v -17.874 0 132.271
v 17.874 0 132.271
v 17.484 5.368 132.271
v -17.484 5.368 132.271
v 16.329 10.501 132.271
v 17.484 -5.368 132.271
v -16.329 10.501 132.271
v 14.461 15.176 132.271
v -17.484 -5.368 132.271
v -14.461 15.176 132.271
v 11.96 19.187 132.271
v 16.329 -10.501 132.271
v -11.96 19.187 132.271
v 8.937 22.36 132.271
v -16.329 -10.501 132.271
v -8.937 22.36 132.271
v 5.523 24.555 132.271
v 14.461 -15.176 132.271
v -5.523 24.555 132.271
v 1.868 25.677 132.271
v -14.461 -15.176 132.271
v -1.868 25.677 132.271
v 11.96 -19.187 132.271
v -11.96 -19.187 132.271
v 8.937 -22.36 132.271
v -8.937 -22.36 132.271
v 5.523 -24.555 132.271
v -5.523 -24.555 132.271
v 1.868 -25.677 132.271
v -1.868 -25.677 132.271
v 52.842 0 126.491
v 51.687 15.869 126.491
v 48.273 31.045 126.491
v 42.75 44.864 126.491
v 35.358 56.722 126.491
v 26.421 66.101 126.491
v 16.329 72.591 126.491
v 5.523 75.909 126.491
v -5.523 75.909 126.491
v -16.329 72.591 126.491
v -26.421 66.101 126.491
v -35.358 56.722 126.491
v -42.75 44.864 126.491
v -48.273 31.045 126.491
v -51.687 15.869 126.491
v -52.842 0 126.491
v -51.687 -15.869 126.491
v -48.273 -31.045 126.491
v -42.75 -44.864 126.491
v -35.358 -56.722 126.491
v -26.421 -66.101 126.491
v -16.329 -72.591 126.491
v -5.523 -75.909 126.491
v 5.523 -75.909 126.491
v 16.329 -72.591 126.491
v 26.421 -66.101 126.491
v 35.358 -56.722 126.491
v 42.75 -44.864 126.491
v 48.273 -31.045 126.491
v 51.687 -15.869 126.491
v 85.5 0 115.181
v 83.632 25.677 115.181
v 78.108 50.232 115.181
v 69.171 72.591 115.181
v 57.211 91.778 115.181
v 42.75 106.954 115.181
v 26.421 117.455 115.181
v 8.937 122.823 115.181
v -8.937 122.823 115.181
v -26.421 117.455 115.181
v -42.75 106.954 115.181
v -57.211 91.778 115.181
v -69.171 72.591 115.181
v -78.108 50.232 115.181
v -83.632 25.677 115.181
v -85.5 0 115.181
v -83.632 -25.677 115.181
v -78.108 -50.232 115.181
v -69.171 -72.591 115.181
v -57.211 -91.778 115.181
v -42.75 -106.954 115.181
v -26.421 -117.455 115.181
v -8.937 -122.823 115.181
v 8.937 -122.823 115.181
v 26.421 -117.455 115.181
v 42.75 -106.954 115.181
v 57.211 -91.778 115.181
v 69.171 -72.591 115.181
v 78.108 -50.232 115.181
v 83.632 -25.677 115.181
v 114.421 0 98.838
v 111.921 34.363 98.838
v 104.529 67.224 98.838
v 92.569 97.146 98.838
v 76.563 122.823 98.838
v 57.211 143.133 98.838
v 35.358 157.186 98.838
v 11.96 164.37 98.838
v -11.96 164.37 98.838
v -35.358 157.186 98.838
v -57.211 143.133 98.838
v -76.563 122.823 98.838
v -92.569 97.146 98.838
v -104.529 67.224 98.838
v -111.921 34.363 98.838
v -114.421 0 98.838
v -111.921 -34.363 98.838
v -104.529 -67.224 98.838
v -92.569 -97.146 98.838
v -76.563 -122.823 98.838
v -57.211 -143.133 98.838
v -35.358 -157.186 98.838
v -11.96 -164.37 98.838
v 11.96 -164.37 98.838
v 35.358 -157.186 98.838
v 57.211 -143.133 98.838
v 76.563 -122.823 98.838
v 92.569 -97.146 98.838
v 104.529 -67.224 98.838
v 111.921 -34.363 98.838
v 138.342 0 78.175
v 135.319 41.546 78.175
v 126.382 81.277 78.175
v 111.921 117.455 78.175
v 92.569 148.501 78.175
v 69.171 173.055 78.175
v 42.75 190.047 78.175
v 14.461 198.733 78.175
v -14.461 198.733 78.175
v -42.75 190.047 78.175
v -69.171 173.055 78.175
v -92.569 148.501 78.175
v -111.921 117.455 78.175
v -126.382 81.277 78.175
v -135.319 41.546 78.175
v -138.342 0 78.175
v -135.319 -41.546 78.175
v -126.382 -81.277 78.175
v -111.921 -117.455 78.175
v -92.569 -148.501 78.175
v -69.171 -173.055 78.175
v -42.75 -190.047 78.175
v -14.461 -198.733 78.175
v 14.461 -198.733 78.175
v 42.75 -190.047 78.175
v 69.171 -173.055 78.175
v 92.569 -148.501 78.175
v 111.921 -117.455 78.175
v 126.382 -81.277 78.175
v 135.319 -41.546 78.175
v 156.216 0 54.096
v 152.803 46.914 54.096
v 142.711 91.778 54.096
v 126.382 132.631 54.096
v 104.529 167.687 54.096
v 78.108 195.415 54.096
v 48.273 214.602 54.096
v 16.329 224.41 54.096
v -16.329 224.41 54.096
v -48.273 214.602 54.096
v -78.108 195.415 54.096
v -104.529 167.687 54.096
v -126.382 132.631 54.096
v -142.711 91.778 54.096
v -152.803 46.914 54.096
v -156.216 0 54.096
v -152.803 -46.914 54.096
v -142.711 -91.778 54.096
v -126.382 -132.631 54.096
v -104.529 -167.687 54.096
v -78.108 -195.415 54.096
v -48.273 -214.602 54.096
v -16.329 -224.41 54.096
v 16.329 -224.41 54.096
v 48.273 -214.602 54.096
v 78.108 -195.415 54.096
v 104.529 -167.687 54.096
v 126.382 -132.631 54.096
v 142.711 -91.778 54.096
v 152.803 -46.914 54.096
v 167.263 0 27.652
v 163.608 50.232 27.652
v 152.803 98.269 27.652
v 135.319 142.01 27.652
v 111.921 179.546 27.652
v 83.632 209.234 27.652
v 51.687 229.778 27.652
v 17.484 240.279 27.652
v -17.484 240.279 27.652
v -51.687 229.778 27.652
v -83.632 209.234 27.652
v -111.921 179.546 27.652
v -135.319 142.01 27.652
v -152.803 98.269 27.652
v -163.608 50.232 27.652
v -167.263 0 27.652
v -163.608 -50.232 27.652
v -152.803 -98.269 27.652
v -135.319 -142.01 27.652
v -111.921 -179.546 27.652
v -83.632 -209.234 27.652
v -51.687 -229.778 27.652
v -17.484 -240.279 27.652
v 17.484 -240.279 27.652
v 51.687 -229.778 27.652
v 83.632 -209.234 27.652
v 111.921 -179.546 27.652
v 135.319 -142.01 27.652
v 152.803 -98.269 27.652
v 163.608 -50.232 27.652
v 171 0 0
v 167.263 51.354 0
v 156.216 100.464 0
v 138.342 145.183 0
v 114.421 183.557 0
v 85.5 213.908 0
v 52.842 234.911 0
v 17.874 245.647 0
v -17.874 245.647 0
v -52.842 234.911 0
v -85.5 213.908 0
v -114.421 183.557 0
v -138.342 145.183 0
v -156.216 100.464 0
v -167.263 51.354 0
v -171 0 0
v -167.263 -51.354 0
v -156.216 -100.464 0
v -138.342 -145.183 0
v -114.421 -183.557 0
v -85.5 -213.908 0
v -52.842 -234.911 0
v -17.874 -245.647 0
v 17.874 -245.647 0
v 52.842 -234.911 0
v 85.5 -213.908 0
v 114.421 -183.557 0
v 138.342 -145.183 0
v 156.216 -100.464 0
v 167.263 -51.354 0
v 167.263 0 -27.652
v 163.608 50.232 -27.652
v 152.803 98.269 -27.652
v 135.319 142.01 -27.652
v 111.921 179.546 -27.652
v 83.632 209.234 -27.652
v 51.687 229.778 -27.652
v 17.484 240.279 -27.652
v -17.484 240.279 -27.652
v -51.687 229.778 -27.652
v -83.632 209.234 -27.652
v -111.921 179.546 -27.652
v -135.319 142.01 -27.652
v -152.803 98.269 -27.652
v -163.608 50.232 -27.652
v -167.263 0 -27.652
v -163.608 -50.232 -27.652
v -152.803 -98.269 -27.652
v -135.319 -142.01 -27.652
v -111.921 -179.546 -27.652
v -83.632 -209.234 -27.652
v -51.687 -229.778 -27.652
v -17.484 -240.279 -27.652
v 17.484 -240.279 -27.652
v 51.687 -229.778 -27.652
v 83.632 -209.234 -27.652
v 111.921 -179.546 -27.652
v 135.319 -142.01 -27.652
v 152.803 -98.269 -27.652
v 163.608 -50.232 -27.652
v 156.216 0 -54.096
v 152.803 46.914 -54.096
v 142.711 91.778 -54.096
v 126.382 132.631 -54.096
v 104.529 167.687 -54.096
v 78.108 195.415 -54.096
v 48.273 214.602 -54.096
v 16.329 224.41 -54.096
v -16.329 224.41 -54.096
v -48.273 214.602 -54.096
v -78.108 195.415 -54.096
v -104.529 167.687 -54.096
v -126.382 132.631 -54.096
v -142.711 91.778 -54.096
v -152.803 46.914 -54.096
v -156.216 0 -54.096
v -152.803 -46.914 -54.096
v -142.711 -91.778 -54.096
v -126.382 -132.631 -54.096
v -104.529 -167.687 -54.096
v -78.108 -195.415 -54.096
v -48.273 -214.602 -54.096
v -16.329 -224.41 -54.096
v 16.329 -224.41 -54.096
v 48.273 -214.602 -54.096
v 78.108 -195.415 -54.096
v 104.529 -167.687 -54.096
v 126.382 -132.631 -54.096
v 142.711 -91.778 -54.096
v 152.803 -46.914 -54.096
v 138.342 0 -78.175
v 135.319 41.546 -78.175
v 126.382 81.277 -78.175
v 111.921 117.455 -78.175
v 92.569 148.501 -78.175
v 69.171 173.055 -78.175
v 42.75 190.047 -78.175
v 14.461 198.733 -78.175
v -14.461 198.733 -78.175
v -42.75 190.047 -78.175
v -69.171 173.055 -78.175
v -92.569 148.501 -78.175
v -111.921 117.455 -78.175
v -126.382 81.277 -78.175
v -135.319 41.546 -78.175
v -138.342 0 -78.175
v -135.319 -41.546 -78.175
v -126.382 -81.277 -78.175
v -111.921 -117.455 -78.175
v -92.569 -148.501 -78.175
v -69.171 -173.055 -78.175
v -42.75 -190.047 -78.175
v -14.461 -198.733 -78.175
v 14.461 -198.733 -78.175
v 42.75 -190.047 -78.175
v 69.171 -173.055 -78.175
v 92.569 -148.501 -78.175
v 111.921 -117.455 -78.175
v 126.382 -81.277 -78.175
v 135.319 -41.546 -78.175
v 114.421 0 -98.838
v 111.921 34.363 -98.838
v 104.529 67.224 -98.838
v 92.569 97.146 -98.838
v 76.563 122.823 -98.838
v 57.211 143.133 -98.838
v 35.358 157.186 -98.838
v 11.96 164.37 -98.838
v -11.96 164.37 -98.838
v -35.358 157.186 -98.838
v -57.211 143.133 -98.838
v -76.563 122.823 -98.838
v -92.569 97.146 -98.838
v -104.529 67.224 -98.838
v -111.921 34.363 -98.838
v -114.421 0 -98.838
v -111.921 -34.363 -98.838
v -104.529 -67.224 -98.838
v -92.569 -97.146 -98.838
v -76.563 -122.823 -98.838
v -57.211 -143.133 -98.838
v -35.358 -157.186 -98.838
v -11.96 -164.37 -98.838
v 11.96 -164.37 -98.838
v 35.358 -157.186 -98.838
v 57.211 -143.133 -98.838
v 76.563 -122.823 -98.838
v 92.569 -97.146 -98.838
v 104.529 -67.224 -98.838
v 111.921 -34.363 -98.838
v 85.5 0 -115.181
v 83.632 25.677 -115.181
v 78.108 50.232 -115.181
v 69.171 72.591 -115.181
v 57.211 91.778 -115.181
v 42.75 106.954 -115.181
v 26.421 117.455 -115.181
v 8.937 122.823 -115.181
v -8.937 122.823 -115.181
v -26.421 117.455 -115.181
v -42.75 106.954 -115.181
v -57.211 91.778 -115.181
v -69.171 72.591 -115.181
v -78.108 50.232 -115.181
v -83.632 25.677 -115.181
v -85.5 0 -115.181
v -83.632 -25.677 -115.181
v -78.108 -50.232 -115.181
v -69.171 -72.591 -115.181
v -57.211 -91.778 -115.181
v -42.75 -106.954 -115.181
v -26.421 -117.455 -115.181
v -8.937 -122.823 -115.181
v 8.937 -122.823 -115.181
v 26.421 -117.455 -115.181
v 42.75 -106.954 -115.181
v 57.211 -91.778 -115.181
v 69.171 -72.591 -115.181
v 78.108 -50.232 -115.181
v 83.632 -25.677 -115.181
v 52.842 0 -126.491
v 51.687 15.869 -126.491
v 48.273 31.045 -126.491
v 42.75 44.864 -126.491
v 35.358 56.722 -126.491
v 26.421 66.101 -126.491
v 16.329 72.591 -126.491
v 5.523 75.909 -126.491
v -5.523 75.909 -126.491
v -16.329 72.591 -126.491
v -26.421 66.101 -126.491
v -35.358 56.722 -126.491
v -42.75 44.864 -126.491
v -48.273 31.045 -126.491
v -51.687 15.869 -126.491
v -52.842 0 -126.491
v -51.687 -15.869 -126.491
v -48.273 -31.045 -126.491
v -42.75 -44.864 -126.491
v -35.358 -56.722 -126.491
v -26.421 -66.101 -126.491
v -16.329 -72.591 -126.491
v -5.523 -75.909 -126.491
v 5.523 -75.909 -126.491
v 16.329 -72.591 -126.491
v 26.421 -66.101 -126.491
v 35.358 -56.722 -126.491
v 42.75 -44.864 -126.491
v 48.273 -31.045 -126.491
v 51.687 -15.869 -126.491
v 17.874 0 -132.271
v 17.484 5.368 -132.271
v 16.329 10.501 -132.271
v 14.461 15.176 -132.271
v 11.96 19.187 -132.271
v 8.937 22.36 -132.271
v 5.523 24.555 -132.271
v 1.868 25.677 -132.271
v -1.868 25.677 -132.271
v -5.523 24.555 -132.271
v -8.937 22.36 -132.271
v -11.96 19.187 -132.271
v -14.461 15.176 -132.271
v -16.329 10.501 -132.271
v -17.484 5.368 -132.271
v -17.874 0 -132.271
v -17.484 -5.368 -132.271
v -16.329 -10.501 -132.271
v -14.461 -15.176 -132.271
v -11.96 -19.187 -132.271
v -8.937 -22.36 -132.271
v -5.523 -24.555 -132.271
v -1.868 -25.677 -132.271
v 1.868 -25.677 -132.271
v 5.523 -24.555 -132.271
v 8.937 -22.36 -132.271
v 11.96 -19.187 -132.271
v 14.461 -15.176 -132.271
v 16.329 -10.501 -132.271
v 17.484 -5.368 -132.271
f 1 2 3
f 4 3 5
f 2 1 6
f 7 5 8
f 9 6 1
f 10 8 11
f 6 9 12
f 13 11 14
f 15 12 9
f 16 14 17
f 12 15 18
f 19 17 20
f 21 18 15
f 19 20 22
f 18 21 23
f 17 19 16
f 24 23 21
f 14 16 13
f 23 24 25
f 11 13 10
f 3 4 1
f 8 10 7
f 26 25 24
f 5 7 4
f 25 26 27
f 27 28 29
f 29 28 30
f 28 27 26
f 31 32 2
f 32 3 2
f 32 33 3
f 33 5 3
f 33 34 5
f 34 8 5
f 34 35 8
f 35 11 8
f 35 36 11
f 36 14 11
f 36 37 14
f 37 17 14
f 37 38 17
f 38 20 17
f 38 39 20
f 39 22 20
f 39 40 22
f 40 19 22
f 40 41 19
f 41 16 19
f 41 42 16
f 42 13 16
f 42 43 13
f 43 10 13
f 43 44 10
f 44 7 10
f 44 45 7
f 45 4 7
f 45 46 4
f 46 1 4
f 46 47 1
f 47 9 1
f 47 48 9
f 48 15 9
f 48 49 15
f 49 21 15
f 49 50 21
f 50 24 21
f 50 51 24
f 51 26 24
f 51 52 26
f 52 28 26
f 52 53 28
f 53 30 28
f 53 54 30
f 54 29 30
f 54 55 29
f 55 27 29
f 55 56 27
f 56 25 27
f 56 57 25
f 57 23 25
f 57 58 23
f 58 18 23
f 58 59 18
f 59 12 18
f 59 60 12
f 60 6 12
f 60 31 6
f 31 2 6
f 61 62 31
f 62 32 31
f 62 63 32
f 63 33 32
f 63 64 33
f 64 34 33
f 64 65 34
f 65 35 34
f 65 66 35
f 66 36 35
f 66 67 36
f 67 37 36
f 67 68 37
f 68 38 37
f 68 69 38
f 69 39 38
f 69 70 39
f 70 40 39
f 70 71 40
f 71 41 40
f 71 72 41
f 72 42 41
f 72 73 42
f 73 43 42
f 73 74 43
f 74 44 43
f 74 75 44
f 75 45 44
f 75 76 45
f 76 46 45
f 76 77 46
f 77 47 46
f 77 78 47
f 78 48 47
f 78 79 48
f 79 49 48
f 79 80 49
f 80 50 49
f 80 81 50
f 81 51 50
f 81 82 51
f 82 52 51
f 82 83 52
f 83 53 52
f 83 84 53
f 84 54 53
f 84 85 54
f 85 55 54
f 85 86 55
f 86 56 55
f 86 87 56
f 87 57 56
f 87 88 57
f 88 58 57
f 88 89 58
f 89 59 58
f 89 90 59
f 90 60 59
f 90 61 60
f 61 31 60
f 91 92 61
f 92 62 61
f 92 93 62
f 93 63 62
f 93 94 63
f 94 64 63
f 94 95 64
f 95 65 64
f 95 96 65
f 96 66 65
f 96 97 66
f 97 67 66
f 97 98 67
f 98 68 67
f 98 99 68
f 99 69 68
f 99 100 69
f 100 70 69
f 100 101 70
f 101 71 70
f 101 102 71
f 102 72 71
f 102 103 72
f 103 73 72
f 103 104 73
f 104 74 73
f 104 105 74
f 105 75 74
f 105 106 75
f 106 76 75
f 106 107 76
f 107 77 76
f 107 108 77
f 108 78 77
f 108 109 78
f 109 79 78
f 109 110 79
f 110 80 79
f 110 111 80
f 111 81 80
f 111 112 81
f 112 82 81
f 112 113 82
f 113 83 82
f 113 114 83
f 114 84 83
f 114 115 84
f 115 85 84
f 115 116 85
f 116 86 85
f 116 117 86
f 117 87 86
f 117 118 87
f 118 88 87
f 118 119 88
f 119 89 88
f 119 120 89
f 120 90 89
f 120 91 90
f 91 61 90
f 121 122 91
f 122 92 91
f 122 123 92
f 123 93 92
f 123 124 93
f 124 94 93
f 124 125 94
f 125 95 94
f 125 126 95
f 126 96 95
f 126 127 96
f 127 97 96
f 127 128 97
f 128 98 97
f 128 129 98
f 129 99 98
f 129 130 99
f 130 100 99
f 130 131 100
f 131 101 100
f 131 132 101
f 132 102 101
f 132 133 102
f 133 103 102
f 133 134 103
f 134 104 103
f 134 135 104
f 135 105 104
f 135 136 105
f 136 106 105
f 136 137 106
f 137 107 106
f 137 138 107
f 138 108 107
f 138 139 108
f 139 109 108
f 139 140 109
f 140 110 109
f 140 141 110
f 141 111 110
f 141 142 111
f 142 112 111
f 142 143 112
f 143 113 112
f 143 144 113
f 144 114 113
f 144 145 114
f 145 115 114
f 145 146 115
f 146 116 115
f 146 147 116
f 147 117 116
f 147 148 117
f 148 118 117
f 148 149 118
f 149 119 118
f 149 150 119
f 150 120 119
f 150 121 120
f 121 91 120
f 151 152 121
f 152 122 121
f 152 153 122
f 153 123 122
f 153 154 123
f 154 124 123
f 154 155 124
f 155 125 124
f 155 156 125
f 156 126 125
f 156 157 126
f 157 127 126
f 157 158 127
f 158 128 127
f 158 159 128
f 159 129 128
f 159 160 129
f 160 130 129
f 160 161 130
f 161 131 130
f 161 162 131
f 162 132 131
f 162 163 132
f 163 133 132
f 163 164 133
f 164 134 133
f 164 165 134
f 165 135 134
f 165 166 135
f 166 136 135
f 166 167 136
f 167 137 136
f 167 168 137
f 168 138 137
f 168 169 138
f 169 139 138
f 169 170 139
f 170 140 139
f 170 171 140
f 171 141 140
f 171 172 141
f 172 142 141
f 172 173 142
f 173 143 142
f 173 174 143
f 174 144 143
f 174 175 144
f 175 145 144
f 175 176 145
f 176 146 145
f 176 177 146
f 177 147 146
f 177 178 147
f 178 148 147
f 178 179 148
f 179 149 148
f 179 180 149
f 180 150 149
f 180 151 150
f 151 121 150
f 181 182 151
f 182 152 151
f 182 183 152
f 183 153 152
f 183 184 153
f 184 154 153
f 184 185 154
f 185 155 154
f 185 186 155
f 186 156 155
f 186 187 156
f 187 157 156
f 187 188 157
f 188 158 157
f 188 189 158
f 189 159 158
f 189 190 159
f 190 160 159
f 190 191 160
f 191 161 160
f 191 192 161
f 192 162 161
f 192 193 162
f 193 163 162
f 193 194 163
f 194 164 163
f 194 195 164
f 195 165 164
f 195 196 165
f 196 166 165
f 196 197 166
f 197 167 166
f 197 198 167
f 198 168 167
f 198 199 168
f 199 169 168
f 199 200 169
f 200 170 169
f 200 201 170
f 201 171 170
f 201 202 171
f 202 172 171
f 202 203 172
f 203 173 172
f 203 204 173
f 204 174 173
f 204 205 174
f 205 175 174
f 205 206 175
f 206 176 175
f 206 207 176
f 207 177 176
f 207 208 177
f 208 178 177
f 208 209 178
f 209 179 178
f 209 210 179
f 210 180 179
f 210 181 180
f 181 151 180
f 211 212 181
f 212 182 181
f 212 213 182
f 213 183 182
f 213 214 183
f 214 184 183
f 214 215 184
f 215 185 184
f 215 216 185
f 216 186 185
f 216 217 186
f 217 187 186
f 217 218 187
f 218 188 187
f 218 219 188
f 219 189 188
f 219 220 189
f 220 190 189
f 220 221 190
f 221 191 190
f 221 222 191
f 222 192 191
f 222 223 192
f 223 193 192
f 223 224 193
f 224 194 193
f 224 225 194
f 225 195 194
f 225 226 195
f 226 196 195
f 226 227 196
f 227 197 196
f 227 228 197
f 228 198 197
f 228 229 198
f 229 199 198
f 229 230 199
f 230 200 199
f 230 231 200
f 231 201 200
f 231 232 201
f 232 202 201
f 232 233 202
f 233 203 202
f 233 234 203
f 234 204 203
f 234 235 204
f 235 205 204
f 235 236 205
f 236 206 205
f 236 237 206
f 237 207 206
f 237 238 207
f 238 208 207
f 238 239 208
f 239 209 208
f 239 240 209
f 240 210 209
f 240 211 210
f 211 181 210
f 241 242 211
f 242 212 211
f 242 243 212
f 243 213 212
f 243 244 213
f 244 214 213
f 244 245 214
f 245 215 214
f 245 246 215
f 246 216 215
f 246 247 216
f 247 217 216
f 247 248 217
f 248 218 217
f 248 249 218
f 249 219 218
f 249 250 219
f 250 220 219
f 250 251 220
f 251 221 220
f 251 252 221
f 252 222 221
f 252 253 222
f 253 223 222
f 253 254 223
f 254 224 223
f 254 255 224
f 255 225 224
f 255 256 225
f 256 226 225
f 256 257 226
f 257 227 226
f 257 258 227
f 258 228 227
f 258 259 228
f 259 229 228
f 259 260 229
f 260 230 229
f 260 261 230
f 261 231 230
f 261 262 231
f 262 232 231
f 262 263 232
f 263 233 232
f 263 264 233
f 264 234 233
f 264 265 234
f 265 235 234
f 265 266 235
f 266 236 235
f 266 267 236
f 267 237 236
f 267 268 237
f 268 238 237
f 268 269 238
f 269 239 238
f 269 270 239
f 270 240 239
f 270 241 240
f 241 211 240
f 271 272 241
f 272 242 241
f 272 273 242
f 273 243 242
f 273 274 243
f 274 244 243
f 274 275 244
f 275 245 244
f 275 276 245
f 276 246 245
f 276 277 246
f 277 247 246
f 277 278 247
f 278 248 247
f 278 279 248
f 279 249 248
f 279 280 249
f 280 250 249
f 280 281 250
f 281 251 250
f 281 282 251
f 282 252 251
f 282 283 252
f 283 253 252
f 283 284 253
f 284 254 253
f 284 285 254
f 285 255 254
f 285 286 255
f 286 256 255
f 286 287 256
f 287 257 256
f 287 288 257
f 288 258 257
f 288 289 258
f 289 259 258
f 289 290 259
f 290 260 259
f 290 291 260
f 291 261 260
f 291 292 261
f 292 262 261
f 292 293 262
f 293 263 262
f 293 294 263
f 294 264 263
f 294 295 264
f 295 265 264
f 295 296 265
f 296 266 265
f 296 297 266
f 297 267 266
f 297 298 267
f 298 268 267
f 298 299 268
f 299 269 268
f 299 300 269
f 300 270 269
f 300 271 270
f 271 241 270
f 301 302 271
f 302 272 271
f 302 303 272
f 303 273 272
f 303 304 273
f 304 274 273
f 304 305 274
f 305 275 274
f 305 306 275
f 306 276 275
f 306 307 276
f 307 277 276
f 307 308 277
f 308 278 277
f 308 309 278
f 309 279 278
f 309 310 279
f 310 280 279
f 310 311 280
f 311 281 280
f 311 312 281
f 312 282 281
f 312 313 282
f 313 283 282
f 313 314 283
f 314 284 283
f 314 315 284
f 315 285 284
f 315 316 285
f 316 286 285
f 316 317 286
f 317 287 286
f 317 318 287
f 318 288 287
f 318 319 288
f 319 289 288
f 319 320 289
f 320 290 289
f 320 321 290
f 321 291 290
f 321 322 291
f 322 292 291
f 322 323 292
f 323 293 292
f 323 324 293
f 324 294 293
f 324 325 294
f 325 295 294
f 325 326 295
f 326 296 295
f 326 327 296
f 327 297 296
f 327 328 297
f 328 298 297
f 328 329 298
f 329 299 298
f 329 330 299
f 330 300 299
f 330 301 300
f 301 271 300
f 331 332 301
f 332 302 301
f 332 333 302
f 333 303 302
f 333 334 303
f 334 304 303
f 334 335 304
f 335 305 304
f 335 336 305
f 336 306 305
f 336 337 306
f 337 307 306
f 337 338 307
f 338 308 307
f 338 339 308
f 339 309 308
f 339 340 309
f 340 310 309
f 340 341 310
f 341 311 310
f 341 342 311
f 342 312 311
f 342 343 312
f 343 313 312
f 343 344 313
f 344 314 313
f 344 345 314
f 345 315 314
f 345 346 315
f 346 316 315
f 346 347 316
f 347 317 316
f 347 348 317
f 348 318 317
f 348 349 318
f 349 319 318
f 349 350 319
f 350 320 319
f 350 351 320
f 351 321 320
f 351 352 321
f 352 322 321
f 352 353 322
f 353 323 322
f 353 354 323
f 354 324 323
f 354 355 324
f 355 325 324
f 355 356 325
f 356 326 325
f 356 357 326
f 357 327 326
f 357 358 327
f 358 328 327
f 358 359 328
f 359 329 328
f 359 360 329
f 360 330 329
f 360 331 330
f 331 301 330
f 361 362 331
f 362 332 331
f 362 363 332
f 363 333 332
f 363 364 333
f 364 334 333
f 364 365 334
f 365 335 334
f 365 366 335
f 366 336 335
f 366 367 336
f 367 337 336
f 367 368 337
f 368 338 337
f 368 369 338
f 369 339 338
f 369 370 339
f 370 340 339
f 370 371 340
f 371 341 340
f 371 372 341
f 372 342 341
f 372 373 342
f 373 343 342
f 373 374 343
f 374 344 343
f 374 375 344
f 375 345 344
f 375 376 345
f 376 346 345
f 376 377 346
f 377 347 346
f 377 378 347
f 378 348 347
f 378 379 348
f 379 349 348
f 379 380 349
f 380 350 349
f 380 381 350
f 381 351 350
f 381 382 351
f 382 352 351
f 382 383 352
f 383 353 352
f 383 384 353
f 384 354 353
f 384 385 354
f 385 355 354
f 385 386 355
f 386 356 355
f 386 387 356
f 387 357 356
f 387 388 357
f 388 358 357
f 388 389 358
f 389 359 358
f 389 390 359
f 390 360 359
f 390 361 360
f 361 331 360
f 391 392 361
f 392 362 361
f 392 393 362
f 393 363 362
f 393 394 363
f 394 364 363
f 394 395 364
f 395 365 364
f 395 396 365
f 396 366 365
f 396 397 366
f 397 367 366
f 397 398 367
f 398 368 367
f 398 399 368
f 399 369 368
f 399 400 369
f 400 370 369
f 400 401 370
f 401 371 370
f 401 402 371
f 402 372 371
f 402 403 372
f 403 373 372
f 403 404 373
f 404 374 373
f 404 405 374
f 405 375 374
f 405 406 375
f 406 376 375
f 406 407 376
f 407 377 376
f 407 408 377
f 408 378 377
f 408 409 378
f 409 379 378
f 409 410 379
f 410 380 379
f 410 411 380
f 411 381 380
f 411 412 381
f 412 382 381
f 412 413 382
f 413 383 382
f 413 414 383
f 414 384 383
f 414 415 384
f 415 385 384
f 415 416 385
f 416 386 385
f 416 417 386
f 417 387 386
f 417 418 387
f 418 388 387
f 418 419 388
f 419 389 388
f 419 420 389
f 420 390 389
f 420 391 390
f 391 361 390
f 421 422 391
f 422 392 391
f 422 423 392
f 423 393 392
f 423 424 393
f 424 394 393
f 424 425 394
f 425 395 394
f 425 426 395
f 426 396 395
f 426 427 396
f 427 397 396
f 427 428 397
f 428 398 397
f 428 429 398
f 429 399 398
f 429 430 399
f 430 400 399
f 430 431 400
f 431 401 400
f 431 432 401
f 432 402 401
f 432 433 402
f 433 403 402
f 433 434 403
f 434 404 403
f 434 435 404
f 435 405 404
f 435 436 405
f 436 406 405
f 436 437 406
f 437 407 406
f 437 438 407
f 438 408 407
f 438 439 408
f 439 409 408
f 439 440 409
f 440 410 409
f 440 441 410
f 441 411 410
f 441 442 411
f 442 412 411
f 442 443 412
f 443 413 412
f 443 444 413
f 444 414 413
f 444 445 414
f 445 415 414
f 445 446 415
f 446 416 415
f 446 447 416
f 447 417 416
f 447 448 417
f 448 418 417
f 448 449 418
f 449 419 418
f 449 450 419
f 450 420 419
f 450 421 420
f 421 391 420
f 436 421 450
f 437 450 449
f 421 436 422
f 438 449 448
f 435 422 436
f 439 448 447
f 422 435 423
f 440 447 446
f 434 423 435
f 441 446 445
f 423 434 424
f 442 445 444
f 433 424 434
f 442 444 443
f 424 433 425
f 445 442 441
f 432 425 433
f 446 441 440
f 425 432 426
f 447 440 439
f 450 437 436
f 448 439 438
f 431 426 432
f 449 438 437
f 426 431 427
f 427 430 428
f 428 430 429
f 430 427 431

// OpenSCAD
// Generated by SolidPython 1.0.1 on 2020-07-29 00:46:48


scale(v = [9, 13, 7]) {
	sphere(r = 19);
}
/***********************************************
*********      SolidPython code:      **********
************************************************
 
# import packages: SolidPython
from solid import *
from solid.utils import *
from itertools import chain, combinations, permutations


class Resize:

    def __init__(self, scad_file):
        self.scad_file = scad_file
        #self.scad_file = import_scad(scad_file)
        # cone/cylinder param:
        self.r1 = 0
        self.r2 = 0
        self.h = 0
        # rectangular prism param:
        self.w = 0
        self.l = 0
        # ellipse param:
        self.r = 0

    # import OpenScad code (file name corresponds to shape)


    # classify shape + parameters
    def assign(self, param1, param2, param3):
        if self.scad_file == 'cone.scad':
            self.r1 = param1
            self.r2 = param2
            self.h = param3
        elif self.scad_file == 'cylinder.scad':
            self.r1 = param1
            self.r2 = param2
            self.h = param3
        elif self.scad_file == 'rectangularPrism.scad':
            self.h = param1
            self.l = param2
            self.w = param3
        else:
            self.r = param1
            self.h = param2

    # resize parameters
    def iterate(self):
        x = range(3, 20, 2)
        i = 1
        if self.scad_file == 'cone.scad':
            tempList = list(permutations(x, 2))
            for temp in tempList:
                param1 = temp[0]
                param2 = temp[1]
                filepath = 'produced_scad_files/' + 'cone' + str(param1) + '_' + str(param2) + '_' + '.scad'
                scad_render_to_file(cylinder(h=param1, r1=param2, r2=0), filepath)

        elif self.scad_file == 'cylinder.scad':
            tempList = list(permutations(x, 3))
            for temp in tempList:
                param1 = temp[0]
                param2 = temp[1]
                filepath = 'produced_scad_files/' + 'cylinder' + str(param1) + '_' + str(param2) + '_' + '.scad'
                scad_render_to_file(cylinder(h=param1, r1=param2, r2=param2), filepath)

        elif self.scad_file == 'rectangularPrism.scad':
            tempList = list(permutations(x, 3))
            for temp in tempList:
                param1 = temp[0]
                param2 = temp[1]
                param3 = temp[2]
                filepath = 'produced_scad_files/' + 'rectangularPrism' + str(param1) + '_' + str(param2) + '_' + str(
                    param3) + '.scad'
                scad_render_to_file(cube(size=(param1, param2, param3)), filepath)

        elif self.scad_file == 'ellipse.scad':
            tempList = list(permutations(x, 4))
            for temp in tempList:
                param1 = temp[0]
                param2 = temp[1]
                param3 = temp[2]
                param4 = temp[3]
                filepath = 'produced_scad_files/' + 'ellipse' + str(param1) + '_' + str(param2) + '_' + str(param3) + '_' + str(param4) + '.scad'
                scad_render_to_file(scale([param1, param2, param3])(sphere(r=param4)), filepath)

    def render_to_scadfile(self):
        scad_render_to_file(scad, 'example.scad') 
 
************************************************/
